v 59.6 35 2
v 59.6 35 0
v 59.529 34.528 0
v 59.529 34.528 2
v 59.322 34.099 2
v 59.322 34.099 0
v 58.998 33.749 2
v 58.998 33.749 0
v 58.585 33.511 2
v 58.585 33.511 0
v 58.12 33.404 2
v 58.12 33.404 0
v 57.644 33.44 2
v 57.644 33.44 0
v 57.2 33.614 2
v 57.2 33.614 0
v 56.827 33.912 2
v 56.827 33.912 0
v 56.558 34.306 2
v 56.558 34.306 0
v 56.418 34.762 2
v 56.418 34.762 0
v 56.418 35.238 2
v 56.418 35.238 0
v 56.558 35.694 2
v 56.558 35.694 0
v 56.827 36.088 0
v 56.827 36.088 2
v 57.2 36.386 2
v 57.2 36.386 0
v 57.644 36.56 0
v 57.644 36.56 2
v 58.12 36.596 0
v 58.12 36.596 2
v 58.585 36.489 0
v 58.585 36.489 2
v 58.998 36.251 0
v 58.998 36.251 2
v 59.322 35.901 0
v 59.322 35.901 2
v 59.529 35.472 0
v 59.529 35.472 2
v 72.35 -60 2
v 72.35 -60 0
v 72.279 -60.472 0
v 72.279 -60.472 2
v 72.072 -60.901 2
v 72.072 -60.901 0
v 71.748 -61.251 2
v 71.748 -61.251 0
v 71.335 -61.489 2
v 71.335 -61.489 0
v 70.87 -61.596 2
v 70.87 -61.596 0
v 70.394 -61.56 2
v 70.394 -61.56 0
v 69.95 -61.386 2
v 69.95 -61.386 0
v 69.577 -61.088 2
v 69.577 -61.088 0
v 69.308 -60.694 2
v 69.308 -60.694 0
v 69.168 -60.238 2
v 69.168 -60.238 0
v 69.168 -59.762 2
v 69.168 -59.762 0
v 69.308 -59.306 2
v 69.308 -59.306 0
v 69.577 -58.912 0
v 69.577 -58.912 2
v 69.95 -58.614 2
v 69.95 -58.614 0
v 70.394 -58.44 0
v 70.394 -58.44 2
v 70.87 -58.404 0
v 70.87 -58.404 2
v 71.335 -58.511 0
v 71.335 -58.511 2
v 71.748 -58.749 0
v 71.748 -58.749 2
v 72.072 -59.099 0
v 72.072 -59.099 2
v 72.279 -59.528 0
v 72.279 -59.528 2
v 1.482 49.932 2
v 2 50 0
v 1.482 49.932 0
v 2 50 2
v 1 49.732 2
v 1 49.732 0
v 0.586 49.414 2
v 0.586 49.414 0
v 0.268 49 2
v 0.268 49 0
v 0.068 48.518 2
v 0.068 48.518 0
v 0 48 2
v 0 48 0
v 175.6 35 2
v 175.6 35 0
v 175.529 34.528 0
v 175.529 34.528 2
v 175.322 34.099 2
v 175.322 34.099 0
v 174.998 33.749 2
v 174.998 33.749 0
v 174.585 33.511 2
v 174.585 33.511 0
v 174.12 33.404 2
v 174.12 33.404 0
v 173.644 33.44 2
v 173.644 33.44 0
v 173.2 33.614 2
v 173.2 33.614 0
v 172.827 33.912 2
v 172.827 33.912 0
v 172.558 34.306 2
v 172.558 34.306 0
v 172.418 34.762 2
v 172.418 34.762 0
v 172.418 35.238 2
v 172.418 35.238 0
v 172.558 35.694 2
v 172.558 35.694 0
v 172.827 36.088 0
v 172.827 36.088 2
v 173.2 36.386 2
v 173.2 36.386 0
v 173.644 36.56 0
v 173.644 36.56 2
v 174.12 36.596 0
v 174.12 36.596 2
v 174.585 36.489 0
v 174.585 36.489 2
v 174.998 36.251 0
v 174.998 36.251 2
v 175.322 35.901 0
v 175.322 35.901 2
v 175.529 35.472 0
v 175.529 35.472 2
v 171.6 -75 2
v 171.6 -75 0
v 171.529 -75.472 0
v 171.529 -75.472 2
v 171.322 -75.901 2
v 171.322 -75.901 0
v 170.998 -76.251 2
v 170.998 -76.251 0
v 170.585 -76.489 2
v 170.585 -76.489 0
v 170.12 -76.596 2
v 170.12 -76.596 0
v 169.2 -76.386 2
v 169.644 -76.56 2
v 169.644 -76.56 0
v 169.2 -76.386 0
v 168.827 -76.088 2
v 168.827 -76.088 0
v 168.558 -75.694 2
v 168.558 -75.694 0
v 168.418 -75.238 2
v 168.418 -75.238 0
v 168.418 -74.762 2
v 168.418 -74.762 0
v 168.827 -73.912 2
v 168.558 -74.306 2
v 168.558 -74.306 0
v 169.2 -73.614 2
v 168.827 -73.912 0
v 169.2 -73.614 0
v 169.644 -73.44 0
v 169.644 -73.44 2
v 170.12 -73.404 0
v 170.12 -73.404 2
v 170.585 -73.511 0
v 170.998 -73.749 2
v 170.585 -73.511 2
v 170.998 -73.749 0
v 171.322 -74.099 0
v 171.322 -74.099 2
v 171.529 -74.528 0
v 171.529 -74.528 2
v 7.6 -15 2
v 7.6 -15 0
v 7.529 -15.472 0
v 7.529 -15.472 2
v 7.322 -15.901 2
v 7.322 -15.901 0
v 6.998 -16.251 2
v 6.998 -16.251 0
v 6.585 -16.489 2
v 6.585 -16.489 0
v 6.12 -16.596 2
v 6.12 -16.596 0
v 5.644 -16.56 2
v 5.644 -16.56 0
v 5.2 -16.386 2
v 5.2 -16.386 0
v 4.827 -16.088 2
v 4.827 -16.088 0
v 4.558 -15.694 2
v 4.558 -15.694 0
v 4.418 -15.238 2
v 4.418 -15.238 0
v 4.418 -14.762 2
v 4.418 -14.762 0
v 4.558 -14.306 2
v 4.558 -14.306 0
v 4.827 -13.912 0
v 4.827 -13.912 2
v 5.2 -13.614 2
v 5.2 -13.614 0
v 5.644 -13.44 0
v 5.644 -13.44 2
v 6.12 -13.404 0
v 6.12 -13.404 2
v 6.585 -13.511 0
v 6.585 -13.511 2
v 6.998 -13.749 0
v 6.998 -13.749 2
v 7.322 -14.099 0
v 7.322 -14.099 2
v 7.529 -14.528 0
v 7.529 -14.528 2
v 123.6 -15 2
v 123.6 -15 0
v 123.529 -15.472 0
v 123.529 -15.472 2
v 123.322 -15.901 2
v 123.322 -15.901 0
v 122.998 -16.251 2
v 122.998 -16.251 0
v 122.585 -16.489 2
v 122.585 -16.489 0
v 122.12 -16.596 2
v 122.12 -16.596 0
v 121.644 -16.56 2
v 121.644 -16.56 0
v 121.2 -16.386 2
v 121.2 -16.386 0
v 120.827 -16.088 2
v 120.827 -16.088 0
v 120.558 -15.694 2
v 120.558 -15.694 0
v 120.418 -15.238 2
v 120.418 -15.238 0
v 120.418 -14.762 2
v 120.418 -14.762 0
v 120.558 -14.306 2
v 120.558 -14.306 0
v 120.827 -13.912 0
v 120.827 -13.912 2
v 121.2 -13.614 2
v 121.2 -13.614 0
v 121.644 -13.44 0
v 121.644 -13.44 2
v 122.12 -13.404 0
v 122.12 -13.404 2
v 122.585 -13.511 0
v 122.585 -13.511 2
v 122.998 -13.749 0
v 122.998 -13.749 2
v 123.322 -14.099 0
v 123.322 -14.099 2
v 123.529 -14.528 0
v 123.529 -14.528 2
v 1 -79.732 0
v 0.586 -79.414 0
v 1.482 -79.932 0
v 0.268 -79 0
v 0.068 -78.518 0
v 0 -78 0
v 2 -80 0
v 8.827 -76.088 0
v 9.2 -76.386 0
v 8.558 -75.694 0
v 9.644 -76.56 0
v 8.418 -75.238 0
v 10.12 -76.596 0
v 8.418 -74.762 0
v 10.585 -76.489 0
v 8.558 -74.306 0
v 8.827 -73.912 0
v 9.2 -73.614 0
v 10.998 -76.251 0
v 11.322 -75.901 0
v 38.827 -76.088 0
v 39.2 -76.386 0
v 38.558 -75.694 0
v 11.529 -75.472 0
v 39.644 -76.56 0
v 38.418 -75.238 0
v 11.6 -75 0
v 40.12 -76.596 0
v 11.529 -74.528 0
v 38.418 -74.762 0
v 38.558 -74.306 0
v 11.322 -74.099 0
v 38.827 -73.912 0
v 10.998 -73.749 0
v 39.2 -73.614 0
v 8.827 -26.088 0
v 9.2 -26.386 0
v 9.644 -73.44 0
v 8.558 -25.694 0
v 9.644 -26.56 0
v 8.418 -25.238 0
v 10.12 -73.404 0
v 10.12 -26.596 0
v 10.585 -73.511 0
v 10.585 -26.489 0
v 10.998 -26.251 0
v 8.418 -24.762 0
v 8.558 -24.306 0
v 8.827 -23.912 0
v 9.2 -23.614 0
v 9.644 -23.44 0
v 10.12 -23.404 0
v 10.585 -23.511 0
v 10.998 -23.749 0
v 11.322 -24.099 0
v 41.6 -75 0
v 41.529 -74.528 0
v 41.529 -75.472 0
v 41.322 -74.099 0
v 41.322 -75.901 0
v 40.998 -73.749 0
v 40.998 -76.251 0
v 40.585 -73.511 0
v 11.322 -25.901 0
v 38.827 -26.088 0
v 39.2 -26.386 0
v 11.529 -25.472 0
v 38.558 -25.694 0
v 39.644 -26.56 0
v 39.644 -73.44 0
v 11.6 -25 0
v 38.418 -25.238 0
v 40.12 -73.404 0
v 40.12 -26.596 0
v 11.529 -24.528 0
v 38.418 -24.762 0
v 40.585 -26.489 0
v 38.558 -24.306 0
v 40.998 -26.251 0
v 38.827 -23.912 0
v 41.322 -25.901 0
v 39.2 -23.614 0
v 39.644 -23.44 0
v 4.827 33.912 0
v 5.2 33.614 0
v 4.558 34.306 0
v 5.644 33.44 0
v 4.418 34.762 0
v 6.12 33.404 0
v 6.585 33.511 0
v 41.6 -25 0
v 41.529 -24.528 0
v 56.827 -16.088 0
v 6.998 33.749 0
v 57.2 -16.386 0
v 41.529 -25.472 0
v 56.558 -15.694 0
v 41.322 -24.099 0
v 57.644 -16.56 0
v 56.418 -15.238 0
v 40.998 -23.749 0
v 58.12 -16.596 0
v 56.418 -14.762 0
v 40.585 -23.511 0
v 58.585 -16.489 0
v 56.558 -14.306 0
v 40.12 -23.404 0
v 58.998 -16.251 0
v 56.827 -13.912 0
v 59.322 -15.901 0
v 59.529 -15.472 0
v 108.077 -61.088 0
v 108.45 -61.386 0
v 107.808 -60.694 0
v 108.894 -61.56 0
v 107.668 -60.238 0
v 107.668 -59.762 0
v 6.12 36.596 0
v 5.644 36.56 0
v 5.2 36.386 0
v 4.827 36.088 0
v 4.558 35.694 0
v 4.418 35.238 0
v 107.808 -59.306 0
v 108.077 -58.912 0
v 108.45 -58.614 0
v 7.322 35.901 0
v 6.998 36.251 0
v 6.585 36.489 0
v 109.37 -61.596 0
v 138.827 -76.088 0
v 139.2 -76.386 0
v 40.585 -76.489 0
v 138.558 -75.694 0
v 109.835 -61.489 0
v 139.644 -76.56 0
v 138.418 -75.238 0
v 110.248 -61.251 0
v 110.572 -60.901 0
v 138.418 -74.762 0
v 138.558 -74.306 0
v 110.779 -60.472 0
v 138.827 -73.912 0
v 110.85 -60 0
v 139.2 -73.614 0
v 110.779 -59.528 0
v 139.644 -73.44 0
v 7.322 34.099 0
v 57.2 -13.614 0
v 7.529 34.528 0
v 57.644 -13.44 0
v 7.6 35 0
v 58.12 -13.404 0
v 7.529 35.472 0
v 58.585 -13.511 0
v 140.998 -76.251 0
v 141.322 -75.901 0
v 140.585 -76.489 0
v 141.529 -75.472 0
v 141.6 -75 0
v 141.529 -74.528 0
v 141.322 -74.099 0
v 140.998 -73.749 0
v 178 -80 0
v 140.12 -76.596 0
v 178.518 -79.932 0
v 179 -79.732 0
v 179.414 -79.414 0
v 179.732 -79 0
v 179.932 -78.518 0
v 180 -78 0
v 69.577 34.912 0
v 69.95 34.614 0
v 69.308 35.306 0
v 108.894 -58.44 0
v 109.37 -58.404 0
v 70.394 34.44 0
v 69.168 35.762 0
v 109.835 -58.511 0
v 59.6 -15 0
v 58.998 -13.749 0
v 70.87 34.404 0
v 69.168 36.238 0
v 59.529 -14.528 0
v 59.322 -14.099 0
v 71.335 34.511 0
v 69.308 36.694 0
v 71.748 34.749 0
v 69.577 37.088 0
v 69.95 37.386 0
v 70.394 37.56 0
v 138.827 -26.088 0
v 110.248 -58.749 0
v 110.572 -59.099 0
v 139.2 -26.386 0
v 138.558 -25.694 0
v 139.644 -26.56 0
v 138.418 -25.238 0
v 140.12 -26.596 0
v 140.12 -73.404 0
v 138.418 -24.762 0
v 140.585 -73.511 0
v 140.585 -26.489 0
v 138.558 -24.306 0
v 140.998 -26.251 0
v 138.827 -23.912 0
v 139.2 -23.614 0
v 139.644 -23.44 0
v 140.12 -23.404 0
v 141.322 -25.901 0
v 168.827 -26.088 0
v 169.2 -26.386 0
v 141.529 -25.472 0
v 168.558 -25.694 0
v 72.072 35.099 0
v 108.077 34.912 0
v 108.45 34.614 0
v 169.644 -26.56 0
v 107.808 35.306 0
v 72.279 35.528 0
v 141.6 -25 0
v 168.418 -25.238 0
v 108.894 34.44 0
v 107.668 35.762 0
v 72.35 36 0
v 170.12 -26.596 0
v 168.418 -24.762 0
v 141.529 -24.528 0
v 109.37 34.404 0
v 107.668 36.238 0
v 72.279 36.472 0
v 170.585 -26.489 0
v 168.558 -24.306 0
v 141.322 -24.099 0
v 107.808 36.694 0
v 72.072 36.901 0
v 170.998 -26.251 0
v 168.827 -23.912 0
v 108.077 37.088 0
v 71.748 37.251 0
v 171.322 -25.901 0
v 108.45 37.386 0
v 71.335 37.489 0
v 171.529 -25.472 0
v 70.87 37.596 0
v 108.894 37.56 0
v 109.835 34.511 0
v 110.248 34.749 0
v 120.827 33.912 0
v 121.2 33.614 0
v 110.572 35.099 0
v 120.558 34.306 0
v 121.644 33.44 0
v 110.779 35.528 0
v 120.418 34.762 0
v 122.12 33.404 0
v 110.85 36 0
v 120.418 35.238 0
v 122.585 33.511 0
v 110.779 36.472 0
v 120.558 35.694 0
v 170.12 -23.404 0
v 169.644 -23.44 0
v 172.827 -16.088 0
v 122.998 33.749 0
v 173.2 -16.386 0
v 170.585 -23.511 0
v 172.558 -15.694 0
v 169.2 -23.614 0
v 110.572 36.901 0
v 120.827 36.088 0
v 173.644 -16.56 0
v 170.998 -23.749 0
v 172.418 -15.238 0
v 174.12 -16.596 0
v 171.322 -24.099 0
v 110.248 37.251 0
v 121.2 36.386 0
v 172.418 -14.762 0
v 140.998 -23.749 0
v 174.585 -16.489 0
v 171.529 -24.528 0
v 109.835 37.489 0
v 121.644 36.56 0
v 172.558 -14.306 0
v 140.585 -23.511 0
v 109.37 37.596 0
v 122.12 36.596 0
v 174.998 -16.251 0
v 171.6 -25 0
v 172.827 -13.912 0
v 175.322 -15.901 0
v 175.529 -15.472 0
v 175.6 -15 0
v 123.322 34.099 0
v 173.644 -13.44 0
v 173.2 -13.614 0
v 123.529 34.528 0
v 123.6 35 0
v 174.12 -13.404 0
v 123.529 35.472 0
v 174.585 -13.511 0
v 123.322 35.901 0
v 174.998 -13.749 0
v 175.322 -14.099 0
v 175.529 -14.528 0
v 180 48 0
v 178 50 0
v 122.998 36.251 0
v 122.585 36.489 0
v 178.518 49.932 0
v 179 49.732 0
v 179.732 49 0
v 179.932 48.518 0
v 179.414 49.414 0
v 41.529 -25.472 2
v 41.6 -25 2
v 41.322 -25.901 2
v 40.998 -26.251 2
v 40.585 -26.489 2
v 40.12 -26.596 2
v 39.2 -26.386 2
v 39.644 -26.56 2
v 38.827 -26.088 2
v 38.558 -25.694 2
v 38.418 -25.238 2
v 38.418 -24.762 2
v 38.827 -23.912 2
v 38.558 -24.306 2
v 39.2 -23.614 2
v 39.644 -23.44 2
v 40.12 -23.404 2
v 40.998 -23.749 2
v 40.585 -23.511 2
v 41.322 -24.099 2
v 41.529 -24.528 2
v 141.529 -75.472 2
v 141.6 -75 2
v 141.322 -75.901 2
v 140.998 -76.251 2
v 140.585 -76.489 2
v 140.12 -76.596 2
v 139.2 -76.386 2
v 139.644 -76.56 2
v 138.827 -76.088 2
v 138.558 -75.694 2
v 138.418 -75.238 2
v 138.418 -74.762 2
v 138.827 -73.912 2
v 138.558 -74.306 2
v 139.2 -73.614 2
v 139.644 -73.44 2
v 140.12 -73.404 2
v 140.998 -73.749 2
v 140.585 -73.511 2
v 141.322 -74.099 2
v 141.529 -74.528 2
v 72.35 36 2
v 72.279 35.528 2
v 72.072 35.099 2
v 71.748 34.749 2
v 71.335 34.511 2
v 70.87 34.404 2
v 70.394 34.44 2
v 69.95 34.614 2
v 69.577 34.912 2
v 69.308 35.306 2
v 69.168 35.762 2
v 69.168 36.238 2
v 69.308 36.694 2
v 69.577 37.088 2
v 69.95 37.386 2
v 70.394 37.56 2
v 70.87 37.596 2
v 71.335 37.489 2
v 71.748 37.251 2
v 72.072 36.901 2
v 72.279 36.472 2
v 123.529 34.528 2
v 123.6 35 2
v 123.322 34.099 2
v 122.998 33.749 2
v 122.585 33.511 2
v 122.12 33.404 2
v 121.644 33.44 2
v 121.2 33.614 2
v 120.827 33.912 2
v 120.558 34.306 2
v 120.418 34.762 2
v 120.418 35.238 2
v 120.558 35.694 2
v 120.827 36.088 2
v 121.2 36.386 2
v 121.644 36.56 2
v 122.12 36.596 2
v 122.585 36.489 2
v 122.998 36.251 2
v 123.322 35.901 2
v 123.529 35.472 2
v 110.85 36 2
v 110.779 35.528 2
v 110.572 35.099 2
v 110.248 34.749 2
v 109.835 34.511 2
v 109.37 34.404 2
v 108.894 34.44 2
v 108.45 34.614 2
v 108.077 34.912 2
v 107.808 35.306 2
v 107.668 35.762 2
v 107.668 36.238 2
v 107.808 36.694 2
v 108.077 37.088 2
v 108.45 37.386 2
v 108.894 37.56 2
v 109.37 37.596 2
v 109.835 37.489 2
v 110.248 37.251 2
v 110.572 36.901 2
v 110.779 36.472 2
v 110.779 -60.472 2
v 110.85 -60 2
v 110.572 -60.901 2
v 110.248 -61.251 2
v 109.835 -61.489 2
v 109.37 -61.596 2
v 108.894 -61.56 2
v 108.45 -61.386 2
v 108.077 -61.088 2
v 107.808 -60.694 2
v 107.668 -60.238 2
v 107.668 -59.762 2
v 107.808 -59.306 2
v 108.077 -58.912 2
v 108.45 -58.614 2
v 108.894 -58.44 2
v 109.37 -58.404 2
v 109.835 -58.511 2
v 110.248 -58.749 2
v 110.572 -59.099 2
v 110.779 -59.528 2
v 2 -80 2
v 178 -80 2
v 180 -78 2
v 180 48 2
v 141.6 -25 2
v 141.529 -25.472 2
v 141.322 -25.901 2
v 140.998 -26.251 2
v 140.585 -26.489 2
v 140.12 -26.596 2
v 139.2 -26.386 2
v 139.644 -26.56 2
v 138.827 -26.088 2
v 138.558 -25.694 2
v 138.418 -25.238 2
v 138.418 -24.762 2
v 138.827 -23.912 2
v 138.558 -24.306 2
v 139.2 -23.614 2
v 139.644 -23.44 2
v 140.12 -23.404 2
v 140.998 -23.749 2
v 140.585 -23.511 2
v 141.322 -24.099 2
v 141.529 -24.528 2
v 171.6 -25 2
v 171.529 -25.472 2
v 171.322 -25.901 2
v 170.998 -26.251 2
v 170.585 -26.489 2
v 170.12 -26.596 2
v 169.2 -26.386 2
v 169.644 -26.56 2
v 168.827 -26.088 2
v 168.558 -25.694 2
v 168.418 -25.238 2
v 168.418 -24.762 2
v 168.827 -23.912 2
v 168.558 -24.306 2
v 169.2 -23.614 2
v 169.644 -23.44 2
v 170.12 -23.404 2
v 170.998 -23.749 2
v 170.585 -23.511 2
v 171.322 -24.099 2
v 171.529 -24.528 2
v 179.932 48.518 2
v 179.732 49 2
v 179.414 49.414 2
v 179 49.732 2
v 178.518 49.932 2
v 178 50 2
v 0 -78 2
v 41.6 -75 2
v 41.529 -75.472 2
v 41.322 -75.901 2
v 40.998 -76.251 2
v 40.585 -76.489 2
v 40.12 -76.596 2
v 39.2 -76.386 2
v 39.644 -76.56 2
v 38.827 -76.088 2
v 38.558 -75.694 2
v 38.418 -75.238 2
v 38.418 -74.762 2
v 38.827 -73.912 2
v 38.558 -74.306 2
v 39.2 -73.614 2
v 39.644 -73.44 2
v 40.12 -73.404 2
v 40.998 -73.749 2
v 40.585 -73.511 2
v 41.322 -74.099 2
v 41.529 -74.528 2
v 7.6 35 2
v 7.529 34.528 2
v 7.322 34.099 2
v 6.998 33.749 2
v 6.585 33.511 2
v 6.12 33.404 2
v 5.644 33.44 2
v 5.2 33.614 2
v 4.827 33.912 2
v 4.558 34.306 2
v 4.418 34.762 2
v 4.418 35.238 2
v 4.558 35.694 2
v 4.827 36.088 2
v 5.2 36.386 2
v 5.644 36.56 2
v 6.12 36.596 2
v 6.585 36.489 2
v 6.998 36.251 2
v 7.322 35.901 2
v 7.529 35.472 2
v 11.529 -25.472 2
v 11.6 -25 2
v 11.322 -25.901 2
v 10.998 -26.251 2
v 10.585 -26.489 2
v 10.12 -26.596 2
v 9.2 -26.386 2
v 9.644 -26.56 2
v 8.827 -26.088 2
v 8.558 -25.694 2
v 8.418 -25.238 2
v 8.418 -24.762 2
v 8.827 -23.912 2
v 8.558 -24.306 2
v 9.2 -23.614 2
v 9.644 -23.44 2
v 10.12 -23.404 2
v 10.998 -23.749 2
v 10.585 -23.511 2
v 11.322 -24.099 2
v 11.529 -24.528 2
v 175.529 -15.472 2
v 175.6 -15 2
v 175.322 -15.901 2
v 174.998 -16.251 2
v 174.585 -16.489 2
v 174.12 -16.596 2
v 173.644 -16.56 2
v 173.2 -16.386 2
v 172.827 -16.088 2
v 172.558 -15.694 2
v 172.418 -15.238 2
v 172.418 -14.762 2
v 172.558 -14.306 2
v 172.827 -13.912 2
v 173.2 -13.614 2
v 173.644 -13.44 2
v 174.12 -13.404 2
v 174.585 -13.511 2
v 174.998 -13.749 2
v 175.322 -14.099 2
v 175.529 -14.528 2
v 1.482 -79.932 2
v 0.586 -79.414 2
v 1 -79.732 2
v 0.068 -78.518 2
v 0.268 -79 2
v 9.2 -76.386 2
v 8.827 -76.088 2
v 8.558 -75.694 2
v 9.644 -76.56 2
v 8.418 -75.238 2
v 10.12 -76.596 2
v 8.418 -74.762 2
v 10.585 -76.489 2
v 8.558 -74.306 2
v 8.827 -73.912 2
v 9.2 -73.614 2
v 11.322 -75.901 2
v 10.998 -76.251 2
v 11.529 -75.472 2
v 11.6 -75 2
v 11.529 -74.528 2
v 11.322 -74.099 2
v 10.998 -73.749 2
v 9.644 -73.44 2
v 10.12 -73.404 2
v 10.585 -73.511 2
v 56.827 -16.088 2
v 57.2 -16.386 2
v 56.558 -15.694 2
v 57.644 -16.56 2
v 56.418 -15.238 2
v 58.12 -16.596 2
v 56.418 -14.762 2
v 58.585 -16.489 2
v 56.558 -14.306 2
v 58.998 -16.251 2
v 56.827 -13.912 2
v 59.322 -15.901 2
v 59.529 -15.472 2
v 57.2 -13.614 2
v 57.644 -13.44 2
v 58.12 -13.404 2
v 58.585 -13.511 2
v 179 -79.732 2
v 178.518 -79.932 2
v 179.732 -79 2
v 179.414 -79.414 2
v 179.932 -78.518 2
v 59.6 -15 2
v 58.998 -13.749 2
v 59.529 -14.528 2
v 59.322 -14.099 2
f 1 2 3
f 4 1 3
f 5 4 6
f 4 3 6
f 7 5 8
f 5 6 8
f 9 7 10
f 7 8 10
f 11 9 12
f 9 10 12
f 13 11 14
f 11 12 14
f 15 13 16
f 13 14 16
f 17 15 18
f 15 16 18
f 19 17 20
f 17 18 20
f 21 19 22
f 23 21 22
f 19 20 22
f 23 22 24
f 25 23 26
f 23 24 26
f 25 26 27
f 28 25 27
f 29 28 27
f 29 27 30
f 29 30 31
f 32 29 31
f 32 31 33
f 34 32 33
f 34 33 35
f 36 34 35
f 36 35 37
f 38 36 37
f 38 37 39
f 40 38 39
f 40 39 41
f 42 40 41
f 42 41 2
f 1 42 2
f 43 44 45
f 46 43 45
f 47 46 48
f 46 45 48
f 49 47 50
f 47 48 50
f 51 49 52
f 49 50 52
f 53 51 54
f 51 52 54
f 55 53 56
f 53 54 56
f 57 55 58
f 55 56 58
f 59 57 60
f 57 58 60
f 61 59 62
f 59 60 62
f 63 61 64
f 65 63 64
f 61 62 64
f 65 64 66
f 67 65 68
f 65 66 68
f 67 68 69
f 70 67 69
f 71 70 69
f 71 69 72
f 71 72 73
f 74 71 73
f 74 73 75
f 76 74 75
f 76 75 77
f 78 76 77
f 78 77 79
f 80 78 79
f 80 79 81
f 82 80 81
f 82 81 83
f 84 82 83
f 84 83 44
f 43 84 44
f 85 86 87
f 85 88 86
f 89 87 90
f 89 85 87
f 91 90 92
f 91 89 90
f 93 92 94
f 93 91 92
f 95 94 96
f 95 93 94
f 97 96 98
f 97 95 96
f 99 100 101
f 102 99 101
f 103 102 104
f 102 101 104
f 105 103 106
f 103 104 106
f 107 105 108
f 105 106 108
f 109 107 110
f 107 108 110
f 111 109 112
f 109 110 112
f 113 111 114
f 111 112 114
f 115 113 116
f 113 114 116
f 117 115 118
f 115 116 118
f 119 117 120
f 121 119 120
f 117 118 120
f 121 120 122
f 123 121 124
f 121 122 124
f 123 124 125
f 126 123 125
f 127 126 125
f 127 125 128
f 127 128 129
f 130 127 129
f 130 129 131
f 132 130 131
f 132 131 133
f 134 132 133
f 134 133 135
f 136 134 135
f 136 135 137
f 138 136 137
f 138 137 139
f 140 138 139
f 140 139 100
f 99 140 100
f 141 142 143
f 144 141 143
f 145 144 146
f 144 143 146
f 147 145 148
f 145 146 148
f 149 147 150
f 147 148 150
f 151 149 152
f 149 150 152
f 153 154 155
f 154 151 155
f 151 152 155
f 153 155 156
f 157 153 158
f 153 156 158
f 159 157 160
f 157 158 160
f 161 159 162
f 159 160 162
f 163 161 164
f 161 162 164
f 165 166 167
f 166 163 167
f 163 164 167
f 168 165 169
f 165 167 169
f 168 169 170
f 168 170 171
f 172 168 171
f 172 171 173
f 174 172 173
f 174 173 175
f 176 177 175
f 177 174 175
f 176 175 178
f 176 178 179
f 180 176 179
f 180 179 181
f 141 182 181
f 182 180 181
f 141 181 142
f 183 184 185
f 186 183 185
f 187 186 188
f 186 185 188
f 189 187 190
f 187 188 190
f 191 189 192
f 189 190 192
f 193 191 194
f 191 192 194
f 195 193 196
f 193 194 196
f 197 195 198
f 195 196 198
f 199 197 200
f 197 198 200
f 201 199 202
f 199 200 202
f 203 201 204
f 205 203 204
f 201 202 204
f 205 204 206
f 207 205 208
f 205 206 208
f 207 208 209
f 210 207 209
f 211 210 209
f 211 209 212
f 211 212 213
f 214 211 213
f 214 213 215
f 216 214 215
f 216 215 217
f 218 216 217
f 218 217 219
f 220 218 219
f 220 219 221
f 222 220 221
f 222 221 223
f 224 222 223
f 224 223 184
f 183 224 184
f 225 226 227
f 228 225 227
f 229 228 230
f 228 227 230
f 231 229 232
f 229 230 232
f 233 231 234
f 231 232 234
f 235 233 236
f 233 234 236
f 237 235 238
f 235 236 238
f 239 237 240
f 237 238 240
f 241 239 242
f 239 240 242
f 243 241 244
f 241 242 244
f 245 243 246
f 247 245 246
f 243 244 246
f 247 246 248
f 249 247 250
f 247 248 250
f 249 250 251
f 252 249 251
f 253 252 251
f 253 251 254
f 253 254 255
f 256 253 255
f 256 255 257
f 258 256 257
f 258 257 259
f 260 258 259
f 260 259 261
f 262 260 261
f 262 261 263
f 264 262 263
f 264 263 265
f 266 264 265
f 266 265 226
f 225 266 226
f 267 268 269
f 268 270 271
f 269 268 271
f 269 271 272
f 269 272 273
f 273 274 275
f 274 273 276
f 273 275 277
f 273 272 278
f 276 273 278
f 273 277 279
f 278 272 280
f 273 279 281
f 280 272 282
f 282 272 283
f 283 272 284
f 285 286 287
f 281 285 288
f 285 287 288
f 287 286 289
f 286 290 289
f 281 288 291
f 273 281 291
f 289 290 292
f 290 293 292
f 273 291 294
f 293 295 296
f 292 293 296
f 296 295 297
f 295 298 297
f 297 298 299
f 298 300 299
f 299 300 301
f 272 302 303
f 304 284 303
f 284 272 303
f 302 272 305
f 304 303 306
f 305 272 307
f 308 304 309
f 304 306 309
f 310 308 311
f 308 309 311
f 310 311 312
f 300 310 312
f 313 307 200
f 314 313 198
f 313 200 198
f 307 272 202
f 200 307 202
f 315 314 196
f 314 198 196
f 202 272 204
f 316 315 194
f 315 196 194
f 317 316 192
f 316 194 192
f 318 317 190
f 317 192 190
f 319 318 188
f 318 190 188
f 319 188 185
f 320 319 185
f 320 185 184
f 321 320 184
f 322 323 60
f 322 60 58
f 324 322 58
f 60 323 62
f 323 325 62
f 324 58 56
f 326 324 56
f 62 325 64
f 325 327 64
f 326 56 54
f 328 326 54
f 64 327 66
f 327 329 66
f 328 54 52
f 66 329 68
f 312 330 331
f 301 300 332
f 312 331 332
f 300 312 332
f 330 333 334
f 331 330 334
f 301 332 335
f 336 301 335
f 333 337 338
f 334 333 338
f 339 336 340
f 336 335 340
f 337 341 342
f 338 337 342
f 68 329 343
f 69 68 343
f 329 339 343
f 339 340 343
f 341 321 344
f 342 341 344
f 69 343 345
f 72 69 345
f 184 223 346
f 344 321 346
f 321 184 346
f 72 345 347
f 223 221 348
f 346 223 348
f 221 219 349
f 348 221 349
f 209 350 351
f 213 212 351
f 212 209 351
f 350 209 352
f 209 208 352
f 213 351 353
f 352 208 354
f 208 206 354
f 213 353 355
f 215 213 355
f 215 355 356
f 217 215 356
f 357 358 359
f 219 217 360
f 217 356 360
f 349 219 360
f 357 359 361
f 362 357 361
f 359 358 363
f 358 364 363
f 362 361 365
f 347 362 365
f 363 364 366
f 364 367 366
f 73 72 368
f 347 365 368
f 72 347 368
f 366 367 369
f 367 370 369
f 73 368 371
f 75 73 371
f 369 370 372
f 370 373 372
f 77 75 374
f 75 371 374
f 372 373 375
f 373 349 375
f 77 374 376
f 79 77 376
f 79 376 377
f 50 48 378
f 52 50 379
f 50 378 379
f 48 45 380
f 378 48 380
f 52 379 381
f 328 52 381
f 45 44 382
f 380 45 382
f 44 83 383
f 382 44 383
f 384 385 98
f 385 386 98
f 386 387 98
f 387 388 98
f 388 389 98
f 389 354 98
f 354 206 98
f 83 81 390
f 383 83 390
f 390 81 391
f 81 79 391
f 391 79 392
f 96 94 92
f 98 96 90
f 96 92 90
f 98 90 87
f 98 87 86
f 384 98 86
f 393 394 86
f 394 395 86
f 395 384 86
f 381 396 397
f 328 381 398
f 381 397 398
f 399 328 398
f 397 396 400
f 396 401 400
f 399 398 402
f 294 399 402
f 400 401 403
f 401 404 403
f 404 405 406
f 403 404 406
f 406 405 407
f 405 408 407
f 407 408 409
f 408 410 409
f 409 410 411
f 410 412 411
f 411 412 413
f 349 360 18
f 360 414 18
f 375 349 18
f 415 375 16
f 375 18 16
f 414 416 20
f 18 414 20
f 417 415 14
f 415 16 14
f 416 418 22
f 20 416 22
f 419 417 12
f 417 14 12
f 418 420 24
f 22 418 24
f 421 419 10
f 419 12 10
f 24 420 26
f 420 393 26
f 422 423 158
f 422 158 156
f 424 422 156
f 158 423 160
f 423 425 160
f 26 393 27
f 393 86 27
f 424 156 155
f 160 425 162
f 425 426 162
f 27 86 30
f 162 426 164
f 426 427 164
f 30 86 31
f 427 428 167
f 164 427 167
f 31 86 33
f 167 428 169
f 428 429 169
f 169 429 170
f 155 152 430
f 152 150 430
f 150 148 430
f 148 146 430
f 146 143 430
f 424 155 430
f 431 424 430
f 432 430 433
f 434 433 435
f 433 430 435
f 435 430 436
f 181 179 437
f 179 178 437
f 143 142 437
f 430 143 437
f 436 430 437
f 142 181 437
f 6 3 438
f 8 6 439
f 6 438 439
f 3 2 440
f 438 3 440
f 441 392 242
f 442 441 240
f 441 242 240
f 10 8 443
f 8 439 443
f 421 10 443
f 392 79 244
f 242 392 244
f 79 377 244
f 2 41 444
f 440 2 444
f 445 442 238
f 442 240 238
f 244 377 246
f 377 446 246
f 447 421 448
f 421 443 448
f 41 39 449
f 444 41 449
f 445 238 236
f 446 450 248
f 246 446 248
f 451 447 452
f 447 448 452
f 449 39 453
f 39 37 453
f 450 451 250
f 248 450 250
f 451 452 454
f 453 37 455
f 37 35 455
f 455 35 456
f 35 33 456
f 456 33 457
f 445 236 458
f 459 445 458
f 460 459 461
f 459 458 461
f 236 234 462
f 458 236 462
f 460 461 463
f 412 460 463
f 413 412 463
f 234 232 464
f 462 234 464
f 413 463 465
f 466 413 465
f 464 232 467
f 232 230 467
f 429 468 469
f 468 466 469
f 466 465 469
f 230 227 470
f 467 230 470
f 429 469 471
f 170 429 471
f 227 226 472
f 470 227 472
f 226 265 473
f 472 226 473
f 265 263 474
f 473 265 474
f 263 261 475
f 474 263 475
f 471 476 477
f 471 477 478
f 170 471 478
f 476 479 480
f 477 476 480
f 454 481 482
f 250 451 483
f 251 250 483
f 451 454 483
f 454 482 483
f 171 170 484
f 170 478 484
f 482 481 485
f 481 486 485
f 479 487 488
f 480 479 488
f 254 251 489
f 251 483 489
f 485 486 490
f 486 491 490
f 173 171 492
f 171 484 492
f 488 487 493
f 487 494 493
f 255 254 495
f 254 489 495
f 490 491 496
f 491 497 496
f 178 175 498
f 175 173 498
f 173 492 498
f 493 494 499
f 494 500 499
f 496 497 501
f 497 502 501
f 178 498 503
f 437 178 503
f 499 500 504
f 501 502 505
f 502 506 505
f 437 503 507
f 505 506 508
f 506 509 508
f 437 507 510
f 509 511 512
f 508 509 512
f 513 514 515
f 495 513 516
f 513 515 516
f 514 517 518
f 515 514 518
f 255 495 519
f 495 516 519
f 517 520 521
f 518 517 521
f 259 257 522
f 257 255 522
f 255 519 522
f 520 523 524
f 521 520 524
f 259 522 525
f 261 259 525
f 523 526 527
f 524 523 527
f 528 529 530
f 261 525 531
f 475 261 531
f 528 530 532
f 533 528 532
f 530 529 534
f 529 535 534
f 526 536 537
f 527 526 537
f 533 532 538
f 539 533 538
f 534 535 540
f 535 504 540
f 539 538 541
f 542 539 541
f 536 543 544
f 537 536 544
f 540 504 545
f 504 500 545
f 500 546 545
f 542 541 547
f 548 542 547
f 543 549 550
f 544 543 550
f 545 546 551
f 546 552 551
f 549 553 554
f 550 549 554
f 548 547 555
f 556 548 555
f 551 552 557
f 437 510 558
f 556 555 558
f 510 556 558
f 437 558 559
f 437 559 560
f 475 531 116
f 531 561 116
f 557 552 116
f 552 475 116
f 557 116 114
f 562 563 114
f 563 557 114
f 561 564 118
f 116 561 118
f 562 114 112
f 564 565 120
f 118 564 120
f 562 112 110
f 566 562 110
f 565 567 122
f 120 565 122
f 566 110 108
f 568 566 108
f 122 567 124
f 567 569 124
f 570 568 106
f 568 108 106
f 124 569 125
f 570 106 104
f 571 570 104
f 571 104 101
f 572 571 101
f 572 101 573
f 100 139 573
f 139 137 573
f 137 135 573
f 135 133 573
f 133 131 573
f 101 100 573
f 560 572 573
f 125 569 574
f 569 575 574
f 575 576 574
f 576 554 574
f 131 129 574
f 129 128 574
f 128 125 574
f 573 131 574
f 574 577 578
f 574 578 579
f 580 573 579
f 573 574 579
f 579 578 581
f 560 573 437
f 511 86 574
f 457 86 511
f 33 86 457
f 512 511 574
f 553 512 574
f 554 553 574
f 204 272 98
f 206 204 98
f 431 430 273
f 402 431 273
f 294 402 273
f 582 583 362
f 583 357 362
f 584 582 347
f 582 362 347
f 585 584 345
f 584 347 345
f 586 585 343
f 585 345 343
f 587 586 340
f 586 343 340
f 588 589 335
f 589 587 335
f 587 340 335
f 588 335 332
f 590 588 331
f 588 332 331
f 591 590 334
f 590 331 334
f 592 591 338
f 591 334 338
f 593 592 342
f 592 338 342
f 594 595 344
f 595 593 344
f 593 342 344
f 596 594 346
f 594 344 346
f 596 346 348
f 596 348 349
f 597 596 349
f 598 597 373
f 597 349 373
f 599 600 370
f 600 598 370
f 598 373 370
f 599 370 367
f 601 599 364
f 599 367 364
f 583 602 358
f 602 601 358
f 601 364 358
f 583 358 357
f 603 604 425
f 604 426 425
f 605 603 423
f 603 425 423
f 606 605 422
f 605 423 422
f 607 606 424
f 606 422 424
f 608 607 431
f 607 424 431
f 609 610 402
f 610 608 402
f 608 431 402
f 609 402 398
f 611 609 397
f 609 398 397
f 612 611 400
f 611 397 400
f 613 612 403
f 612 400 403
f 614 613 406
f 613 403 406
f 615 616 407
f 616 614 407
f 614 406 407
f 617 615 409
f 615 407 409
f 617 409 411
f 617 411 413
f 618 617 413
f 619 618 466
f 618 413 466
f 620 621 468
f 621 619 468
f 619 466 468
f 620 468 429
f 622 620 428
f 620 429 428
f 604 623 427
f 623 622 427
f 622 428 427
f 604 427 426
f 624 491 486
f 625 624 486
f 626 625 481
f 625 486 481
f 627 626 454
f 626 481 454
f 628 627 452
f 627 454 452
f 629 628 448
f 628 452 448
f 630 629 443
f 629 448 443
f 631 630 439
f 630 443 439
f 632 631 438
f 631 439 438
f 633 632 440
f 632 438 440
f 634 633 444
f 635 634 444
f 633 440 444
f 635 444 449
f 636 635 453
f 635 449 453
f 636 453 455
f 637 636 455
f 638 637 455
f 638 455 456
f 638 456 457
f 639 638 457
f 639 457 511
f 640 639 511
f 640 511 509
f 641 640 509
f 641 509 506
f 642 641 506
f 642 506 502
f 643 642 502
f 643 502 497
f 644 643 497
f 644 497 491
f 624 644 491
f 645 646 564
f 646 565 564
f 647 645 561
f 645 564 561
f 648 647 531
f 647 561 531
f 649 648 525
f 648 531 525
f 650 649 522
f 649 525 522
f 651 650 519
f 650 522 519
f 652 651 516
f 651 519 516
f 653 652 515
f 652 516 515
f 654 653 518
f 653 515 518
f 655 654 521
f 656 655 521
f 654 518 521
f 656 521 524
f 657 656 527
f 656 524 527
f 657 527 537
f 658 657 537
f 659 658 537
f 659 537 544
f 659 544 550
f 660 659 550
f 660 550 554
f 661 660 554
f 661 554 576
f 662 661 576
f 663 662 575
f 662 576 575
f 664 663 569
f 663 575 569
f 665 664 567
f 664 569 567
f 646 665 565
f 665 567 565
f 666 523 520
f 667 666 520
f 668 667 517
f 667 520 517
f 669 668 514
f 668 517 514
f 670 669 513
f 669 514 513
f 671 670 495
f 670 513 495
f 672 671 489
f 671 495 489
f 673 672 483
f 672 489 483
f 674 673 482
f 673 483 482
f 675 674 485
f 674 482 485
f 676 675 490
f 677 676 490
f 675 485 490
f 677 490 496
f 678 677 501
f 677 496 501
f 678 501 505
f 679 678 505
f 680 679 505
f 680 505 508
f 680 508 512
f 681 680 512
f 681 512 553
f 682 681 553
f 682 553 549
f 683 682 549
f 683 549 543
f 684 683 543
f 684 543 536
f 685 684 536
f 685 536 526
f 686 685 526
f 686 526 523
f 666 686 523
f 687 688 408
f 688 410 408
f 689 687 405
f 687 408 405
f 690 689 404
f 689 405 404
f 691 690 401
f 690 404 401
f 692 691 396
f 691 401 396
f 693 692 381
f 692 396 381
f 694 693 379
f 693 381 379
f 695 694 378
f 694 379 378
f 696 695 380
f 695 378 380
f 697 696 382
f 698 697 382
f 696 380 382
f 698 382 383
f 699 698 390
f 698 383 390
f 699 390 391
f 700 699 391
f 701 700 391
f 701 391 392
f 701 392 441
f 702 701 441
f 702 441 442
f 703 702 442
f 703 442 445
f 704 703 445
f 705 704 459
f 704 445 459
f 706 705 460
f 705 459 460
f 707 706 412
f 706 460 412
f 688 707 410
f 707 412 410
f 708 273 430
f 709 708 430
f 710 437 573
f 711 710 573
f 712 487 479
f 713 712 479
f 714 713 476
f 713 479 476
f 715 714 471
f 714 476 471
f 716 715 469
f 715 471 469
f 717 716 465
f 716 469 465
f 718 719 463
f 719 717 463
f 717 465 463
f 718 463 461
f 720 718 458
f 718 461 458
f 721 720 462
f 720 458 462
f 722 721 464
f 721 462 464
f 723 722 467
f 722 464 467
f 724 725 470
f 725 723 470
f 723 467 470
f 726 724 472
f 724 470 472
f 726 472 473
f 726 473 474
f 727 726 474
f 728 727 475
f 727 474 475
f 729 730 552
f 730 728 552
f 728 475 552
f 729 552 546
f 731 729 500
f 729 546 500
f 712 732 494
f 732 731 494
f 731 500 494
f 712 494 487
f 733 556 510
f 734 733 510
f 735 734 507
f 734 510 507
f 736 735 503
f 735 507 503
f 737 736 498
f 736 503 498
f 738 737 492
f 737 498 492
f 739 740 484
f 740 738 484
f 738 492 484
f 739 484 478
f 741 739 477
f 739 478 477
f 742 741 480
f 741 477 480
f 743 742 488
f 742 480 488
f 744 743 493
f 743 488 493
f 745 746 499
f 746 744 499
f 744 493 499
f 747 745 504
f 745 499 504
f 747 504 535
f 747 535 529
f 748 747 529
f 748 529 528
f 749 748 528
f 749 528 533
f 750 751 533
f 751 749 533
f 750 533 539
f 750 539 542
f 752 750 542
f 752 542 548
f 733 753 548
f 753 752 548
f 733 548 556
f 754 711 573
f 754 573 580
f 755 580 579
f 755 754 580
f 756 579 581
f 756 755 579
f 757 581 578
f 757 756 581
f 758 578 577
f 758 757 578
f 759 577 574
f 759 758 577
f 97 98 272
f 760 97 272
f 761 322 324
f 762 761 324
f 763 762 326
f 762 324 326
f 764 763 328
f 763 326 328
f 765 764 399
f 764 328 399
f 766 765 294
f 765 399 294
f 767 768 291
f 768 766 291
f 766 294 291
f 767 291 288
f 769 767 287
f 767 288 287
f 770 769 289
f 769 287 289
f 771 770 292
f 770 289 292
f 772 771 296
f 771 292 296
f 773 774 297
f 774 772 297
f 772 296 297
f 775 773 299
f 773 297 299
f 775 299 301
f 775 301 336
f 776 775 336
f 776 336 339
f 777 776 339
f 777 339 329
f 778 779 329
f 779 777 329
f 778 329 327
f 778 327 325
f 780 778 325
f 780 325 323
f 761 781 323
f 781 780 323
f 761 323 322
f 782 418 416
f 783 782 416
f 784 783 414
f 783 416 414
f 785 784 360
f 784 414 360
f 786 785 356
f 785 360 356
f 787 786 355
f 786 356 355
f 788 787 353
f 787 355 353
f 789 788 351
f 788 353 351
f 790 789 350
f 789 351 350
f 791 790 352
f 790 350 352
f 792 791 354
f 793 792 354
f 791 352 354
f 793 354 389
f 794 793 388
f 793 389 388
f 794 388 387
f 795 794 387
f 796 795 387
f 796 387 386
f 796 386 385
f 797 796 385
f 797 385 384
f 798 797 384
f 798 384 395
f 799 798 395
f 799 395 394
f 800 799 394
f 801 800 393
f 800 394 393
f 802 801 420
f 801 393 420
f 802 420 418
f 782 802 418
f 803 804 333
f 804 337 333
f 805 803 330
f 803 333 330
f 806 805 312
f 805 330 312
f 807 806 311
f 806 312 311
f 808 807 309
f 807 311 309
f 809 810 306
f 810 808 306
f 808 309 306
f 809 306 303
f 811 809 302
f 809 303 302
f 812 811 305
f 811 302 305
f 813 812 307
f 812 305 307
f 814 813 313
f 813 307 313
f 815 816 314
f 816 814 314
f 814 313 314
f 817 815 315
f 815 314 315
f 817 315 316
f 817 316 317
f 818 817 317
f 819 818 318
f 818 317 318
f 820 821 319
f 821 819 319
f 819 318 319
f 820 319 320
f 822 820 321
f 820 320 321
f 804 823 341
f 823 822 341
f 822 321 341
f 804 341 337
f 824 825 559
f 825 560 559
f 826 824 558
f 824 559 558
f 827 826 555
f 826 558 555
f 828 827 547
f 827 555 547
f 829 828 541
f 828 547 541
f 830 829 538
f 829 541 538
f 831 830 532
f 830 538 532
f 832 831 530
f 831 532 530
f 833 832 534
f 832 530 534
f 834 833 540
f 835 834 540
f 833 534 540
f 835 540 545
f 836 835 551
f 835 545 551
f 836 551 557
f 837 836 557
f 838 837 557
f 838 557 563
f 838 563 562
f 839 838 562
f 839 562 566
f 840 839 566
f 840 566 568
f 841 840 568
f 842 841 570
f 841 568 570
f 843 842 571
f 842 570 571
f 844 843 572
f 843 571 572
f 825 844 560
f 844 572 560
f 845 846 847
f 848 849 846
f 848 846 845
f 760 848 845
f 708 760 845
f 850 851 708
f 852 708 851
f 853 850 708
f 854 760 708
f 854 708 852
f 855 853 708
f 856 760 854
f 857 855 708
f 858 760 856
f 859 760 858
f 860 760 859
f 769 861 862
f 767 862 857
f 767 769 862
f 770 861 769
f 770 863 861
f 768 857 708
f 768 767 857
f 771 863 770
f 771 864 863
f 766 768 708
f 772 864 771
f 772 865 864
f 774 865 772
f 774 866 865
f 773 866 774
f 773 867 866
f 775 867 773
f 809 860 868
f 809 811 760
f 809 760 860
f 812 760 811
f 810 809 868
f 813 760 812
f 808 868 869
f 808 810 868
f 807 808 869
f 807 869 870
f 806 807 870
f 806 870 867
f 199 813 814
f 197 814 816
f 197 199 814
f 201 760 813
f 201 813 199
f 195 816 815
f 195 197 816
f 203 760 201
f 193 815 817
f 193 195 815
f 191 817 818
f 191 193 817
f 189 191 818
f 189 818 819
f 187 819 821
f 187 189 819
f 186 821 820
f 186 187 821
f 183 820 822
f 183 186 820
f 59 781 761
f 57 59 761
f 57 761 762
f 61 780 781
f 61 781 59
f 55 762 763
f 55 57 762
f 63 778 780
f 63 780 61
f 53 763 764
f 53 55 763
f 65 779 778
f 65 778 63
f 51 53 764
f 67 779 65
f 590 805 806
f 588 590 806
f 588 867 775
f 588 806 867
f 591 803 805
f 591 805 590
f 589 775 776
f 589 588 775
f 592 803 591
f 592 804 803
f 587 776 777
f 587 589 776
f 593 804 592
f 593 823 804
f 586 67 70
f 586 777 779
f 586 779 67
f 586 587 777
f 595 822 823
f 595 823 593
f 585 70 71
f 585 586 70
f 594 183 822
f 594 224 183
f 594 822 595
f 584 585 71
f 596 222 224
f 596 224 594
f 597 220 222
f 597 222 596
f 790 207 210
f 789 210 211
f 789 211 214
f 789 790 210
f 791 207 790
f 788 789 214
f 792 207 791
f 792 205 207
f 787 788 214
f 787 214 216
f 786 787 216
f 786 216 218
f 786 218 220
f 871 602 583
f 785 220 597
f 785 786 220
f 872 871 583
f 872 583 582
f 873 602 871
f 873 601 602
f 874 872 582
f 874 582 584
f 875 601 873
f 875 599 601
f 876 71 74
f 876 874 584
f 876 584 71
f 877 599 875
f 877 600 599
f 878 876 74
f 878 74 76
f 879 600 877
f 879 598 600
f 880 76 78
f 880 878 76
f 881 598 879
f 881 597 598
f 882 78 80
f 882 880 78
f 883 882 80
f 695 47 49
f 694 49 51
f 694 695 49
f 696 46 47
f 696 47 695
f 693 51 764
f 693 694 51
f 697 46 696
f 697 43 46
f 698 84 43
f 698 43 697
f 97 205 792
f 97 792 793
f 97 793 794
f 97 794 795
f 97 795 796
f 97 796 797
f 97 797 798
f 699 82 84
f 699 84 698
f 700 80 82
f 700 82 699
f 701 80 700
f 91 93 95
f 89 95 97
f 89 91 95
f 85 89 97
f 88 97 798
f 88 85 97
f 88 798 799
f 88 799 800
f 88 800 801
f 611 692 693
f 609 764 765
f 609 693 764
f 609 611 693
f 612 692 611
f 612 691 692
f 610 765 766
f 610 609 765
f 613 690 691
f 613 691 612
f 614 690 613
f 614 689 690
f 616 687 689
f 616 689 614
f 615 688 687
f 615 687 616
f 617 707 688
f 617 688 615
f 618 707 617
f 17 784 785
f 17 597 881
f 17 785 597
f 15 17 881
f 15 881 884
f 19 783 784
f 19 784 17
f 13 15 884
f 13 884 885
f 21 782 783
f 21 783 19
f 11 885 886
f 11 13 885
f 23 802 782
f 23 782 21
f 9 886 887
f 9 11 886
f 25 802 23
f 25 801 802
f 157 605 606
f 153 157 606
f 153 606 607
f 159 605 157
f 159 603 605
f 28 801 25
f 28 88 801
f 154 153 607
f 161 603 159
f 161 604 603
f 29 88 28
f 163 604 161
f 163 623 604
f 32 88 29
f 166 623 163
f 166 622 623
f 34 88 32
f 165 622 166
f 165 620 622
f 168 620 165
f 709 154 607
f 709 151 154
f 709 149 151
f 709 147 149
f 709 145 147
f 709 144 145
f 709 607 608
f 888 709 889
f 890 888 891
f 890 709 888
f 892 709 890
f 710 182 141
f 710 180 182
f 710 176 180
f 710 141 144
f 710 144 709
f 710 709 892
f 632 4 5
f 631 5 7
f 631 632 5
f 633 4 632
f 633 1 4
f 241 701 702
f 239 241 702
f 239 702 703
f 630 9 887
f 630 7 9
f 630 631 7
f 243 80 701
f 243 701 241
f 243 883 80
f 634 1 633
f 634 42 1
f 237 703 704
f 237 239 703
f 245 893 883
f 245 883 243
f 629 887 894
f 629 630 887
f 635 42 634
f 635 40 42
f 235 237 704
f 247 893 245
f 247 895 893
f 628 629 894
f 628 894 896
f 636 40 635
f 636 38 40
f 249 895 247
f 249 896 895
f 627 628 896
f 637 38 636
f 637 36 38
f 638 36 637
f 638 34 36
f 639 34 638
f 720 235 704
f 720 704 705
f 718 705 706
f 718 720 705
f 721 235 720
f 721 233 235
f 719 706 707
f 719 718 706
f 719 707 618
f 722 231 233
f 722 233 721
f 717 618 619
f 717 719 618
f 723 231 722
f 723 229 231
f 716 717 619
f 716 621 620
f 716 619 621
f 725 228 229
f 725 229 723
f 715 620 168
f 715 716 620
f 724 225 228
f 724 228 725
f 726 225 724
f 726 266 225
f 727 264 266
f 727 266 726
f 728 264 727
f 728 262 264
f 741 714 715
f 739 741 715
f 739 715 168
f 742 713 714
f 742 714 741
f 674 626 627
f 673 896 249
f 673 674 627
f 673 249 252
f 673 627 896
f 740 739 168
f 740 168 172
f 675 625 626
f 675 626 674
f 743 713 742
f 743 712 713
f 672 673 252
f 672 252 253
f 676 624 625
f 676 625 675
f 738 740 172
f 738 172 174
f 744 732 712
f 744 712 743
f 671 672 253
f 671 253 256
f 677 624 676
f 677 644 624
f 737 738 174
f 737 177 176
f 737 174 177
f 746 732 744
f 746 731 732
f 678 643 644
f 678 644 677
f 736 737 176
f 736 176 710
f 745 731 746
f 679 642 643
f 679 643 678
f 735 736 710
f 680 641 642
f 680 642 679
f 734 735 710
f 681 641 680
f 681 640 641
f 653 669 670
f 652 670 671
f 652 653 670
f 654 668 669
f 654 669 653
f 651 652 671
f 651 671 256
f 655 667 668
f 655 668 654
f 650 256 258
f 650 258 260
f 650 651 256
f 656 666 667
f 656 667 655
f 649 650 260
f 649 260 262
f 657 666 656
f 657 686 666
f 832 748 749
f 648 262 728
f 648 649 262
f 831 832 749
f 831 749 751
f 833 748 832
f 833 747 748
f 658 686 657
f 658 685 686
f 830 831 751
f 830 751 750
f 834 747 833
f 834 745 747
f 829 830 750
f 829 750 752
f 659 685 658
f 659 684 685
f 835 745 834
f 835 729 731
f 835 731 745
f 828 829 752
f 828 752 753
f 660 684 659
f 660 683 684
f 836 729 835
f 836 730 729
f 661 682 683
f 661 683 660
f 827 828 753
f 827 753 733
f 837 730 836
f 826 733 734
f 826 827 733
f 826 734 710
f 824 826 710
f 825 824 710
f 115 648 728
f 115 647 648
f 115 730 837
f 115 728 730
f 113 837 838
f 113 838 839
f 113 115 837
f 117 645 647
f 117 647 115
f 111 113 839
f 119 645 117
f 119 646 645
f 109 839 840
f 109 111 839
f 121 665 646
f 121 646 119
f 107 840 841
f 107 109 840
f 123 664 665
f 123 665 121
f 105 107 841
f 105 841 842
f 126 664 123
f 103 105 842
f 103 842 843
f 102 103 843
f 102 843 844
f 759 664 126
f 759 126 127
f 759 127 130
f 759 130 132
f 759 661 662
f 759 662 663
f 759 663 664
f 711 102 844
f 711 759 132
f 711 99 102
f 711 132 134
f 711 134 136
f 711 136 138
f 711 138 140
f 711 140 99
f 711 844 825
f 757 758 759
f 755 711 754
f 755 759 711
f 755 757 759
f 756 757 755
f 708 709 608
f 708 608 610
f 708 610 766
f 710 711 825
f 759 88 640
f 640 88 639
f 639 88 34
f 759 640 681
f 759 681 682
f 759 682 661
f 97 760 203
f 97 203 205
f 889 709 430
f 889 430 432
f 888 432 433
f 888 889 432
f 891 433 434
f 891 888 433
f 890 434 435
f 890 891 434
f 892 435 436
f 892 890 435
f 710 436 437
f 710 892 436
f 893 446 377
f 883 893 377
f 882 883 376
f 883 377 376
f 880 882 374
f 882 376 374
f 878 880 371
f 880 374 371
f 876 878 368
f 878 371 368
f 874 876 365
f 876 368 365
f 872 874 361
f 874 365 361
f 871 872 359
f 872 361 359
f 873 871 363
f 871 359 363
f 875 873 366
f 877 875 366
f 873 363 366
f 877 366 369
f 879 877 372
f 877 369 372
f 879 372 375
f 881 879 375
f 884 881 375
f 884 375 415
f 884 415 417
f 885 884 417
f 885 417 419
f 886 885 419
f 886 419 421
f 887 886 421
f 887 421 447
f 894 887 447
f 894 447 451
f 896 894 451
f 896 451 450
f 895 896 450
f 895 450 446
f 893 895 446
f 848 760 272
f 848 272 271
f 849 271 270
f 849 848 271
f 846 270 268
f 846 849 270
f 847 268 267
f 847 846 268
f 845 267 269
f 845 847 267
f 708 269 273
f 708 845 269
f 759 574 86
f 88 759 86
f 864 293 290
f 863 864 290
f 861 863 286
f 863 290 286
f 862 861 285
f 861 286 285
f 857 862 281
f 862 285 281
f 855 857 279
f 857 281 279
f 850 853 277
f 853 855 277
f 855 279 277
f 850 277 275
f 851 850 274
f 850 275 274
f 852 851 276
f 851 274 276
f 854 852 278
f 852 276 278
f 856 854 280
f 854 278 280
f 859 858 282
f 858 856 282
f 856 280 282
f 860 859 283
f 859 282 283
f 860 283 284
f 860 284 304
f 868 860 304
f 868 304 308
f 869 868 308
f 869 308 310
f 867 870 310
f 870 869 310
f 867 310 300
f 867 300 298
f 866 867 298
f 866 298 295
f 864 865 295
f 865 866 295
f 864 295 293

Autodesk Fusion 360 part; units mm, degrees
sketch "スケッチ1" plane through (0, 0, 0) normal (0, 0, 1) x (1, 0, 0)
  line L0 (0, 0) -> (180, 0)
  line L1 (180, 0) -> (180, -100)
  line L2 (180, -100) -> (0, -100)
  line L3 (0, -100) -> (0, 0)
  line L4 (0, -50) -> (180, -50) construction
  line L5 (10, -50) -> (10, -25) construction
  line L6 (10, -25) -> (40, -25) construction
  line L7 (40, -25) -> (40, -50) construction
  line L8 (90, 0) -> (90, -100) construction
  line L9 (10, -50) -> (10, -75) construction
  line L10 (10, -75) -> (40, -75) construction
  line L11 (40, -75) -> (40, -50) construction
  line L12 (140, -75) -> (140, -50) construction
  line L13 (140, -25) -> (140, -50) construction
  line L14 (170, -25) -> (140, -25) construction
  line L15 (170, -50) -> (170, -25) construction
  line L16 (170, -50) -> (170, -75) construction
  line L17 (170, -75) -> (140, -75) construction
  circle A0 centre (10, -25) radius 1.6
  circle A1 centre (40, -25) radius 1.6
  circle A2 centre (10, -75) radius 1.6
  circle A3 centre (40, -75) radius 1.6
  circle A4 centre (170, -25) radius 1.6
  circle A5 centre (140, -25) radius 1.6
  circle A6 centre (140, -75) radius 1.6
  circle A7 centre (170, -75) radius 1.6
  line L18 (40, -37.5) -> (35, -37.5)
  line L19 (35, -37.5) -> (35, -65)
  line L20 (35, -65) -> (45, -65)
  line L21 (45, -65) -> (45, -37.5)
  line L22 (45, -37.5) -> (40, -37.5)
  line L23 (145, -65) -> (135, -65)
  line L24 (135, -65) -> (135, -37.5)
  line L25 (135, -37.5) -> (140, -37.5)
  line L26 (140, -37.5) -> (145, -37.5)
  line L27 (145, -37.5) -> (145, -65)
  line L28 (90, 0) -> (64.5, 0) construction
  line L29 (64.5, 0) -> (64.5, -100) construction
  line L30 (115.5, 0) -> (115.5, -100) construction
  line L31 (64.5, -50) -> (64.5, -9) construction
  line L32 (115.5, -91) -> (115.5, -79)
  circle A8 centre (5, -95) radius 1.6
  circle A9 centre (175, -95) radius 1.6
  line L33 (0, -10) -> (180, -10)
  line L34 (180, -90) -> (0, -90)
  line L35 (0, -80) -> (180, -80)
  line L36 (0, -20) -> (180, -20)
  line L37 (0, 0) -> (180, 0)
  line L38 (180, 0) -> (180, 50)
  line L39 (180, 50) -> (0, 50)
  line L40 (0, 50) -> (0, 0)
  line L41 (90, -80) -> (90, -60)
  line L42 (90, -60) -> (109.25, -60)
  line L43 (109.25, -60) -> (70.75, -60)
  line L44 (70.75, -60) -> (70.75, 36)
  line L45 (70.75, 36) -> (109.25, 36)
  line L46 (109.25, 36) -> (109.25, -60)
  circle A10 centre (70.75, 36) radius 1.6
  circle A11 centre (109.25, 36) radius 1.6
  circle A12 centre (70.75, -60) radius 1.6
  circle A13 centre (109.25, -60) radius 1.6
  line L47 (180, 50) -> (180, 35)
  line L48 (180, 35) -> (0, 35)
  line L49 (0, 35) -> (6, 35)
  circle A14 centre (6, 35) radius 1.6
  circle A15 centre (174, 35) radius 1.6
  line L50 (6, 35) -> (58, 35)
  line L51 (58, 35) -> (58, -15)
  line L52 (58, -15) -> (6, -15)
  line L53 (6, -15) -> (6, 35)
  circle A16 centre (6, -15) radius 1.6
  circle A17 centre (58, -15) radius 1.6
  circle A18 centre (58, 35) radius 1.6
  circle A19 centre (122, 35) radius 1.6
  circle A20 centre (174, 35) radius 1.6
  circle A21 centre (174, -15) radius 1.6
  circle A22 centre (122, -15) radius 1.6
  line L54 (122, 35) -> (122, -15)
  line L55 (174, -15) -> (174, 35)
  line L56 (174, 35) -> (122, 35)
  line L57 (122, -15) -> (174, -15)
  line L58 (58, 35) -> (64, 35)
  line L59 (64, 35) -> (64, 50)
  line L60 (64, 50) -> (0, 50)
  line L61 (0, 50) -> (0, -20)
  line L62 (0, -20) -> (64, -20)
  line L63 (64, -20) -> (64, 50)
  dimension "d1" = 180
  dimension "d2" = 100
  dimension "d3" = 3.2
  dimension "d4" = 3.2
  dimension "d7" = 5
  dimension "d8" = 5
  dimension "d9" = 25.5
  dimension "d10" = 41
  dimension "d22" = 20
  dimension "d23" = 19.25
  dimension "d24" = 38.5
  dimension "d25" = 96
  dimension "d26" = 3.2
  dimension "d27" = 3.2
  dimension "d28" = 3.2
  dimension "d29" = 3.2
  dimension "d30" = 15
  dimension "d31" = 6
  dimension "d32" = 3.2
  dimension "d33" = 52
  dimension "d34" = 50
  dimension "d35" = 3.2
  dimension "d36" = 3.2
  dimension "d37" = 3.2
  dimension "d38" = 70
extrude "押し出し1" add sketch "スケッチ1" along normal blind 2 contours L0 L37 L40 L48 L49 A14 L53 L61 | L0 L3 L33 L37 L53 L61 | L0 L37 L48 A14 L50 L51 L53 A18 | L0 L33 L37 L51 L53 | L3 L33 L36 L51 L52 L53 A16 A17 L61 L62 L63 | L39 L40 L48 L49 A14 L50 A18 L58 L59 L60 L61 L63 | L0 L37 L48 L51 A18 L58 L63 | L0 L33 L37 L51 L63 | L33 L51 L52 L53 A16 A17 | L3 L35 L36 L41 L43 L44 A12 L62 | L0 L37 L44 A10 L48 L63 | L0 L33 L37 L44 L63 | L33 L36 L44 L63 | L38 L39 L45 A10 A11 L47 L48 A15 A19 A20 L56 L59 L63 | L0 L37 L44 L46 A10 A11 L48 | L0 L33 L37 L44 L46 | L1 L35 L36 L41 L42 L43 L46 A13 | L33 L36 L44 L46 | L36 L42 L43 L44 L46 A12 A13 | L0 L37 L46 A11 L48 A19 L54 | L0 L33 L37 L46 L54 | L1 L33 L36 L46 A21 A22 L54 L55 L57 | L0 L37 L38 L48 A15 A20 L55 | L0 L37 L48 A15 A19 A20 L54 L55 L56 | L0 L33 L37 L54 L55 | L45 A10 A11 L48 | L0 L1 L33 L37 L55 | L33 A21 A22 L54 L55 L57 | L18 L19 L20 L21 L22 | L23 L24 L25 L26 L27
fillet "フィレット1" radius 2 4 edges at (0, -80, 1) (180, -80, 1) (0, 50, 1) (180, 50, 1)
equation "d9 = ( 51 / 2 ) * 1 mm"
equation "d10 = ( 82 / 2 ) * 1 mm"
